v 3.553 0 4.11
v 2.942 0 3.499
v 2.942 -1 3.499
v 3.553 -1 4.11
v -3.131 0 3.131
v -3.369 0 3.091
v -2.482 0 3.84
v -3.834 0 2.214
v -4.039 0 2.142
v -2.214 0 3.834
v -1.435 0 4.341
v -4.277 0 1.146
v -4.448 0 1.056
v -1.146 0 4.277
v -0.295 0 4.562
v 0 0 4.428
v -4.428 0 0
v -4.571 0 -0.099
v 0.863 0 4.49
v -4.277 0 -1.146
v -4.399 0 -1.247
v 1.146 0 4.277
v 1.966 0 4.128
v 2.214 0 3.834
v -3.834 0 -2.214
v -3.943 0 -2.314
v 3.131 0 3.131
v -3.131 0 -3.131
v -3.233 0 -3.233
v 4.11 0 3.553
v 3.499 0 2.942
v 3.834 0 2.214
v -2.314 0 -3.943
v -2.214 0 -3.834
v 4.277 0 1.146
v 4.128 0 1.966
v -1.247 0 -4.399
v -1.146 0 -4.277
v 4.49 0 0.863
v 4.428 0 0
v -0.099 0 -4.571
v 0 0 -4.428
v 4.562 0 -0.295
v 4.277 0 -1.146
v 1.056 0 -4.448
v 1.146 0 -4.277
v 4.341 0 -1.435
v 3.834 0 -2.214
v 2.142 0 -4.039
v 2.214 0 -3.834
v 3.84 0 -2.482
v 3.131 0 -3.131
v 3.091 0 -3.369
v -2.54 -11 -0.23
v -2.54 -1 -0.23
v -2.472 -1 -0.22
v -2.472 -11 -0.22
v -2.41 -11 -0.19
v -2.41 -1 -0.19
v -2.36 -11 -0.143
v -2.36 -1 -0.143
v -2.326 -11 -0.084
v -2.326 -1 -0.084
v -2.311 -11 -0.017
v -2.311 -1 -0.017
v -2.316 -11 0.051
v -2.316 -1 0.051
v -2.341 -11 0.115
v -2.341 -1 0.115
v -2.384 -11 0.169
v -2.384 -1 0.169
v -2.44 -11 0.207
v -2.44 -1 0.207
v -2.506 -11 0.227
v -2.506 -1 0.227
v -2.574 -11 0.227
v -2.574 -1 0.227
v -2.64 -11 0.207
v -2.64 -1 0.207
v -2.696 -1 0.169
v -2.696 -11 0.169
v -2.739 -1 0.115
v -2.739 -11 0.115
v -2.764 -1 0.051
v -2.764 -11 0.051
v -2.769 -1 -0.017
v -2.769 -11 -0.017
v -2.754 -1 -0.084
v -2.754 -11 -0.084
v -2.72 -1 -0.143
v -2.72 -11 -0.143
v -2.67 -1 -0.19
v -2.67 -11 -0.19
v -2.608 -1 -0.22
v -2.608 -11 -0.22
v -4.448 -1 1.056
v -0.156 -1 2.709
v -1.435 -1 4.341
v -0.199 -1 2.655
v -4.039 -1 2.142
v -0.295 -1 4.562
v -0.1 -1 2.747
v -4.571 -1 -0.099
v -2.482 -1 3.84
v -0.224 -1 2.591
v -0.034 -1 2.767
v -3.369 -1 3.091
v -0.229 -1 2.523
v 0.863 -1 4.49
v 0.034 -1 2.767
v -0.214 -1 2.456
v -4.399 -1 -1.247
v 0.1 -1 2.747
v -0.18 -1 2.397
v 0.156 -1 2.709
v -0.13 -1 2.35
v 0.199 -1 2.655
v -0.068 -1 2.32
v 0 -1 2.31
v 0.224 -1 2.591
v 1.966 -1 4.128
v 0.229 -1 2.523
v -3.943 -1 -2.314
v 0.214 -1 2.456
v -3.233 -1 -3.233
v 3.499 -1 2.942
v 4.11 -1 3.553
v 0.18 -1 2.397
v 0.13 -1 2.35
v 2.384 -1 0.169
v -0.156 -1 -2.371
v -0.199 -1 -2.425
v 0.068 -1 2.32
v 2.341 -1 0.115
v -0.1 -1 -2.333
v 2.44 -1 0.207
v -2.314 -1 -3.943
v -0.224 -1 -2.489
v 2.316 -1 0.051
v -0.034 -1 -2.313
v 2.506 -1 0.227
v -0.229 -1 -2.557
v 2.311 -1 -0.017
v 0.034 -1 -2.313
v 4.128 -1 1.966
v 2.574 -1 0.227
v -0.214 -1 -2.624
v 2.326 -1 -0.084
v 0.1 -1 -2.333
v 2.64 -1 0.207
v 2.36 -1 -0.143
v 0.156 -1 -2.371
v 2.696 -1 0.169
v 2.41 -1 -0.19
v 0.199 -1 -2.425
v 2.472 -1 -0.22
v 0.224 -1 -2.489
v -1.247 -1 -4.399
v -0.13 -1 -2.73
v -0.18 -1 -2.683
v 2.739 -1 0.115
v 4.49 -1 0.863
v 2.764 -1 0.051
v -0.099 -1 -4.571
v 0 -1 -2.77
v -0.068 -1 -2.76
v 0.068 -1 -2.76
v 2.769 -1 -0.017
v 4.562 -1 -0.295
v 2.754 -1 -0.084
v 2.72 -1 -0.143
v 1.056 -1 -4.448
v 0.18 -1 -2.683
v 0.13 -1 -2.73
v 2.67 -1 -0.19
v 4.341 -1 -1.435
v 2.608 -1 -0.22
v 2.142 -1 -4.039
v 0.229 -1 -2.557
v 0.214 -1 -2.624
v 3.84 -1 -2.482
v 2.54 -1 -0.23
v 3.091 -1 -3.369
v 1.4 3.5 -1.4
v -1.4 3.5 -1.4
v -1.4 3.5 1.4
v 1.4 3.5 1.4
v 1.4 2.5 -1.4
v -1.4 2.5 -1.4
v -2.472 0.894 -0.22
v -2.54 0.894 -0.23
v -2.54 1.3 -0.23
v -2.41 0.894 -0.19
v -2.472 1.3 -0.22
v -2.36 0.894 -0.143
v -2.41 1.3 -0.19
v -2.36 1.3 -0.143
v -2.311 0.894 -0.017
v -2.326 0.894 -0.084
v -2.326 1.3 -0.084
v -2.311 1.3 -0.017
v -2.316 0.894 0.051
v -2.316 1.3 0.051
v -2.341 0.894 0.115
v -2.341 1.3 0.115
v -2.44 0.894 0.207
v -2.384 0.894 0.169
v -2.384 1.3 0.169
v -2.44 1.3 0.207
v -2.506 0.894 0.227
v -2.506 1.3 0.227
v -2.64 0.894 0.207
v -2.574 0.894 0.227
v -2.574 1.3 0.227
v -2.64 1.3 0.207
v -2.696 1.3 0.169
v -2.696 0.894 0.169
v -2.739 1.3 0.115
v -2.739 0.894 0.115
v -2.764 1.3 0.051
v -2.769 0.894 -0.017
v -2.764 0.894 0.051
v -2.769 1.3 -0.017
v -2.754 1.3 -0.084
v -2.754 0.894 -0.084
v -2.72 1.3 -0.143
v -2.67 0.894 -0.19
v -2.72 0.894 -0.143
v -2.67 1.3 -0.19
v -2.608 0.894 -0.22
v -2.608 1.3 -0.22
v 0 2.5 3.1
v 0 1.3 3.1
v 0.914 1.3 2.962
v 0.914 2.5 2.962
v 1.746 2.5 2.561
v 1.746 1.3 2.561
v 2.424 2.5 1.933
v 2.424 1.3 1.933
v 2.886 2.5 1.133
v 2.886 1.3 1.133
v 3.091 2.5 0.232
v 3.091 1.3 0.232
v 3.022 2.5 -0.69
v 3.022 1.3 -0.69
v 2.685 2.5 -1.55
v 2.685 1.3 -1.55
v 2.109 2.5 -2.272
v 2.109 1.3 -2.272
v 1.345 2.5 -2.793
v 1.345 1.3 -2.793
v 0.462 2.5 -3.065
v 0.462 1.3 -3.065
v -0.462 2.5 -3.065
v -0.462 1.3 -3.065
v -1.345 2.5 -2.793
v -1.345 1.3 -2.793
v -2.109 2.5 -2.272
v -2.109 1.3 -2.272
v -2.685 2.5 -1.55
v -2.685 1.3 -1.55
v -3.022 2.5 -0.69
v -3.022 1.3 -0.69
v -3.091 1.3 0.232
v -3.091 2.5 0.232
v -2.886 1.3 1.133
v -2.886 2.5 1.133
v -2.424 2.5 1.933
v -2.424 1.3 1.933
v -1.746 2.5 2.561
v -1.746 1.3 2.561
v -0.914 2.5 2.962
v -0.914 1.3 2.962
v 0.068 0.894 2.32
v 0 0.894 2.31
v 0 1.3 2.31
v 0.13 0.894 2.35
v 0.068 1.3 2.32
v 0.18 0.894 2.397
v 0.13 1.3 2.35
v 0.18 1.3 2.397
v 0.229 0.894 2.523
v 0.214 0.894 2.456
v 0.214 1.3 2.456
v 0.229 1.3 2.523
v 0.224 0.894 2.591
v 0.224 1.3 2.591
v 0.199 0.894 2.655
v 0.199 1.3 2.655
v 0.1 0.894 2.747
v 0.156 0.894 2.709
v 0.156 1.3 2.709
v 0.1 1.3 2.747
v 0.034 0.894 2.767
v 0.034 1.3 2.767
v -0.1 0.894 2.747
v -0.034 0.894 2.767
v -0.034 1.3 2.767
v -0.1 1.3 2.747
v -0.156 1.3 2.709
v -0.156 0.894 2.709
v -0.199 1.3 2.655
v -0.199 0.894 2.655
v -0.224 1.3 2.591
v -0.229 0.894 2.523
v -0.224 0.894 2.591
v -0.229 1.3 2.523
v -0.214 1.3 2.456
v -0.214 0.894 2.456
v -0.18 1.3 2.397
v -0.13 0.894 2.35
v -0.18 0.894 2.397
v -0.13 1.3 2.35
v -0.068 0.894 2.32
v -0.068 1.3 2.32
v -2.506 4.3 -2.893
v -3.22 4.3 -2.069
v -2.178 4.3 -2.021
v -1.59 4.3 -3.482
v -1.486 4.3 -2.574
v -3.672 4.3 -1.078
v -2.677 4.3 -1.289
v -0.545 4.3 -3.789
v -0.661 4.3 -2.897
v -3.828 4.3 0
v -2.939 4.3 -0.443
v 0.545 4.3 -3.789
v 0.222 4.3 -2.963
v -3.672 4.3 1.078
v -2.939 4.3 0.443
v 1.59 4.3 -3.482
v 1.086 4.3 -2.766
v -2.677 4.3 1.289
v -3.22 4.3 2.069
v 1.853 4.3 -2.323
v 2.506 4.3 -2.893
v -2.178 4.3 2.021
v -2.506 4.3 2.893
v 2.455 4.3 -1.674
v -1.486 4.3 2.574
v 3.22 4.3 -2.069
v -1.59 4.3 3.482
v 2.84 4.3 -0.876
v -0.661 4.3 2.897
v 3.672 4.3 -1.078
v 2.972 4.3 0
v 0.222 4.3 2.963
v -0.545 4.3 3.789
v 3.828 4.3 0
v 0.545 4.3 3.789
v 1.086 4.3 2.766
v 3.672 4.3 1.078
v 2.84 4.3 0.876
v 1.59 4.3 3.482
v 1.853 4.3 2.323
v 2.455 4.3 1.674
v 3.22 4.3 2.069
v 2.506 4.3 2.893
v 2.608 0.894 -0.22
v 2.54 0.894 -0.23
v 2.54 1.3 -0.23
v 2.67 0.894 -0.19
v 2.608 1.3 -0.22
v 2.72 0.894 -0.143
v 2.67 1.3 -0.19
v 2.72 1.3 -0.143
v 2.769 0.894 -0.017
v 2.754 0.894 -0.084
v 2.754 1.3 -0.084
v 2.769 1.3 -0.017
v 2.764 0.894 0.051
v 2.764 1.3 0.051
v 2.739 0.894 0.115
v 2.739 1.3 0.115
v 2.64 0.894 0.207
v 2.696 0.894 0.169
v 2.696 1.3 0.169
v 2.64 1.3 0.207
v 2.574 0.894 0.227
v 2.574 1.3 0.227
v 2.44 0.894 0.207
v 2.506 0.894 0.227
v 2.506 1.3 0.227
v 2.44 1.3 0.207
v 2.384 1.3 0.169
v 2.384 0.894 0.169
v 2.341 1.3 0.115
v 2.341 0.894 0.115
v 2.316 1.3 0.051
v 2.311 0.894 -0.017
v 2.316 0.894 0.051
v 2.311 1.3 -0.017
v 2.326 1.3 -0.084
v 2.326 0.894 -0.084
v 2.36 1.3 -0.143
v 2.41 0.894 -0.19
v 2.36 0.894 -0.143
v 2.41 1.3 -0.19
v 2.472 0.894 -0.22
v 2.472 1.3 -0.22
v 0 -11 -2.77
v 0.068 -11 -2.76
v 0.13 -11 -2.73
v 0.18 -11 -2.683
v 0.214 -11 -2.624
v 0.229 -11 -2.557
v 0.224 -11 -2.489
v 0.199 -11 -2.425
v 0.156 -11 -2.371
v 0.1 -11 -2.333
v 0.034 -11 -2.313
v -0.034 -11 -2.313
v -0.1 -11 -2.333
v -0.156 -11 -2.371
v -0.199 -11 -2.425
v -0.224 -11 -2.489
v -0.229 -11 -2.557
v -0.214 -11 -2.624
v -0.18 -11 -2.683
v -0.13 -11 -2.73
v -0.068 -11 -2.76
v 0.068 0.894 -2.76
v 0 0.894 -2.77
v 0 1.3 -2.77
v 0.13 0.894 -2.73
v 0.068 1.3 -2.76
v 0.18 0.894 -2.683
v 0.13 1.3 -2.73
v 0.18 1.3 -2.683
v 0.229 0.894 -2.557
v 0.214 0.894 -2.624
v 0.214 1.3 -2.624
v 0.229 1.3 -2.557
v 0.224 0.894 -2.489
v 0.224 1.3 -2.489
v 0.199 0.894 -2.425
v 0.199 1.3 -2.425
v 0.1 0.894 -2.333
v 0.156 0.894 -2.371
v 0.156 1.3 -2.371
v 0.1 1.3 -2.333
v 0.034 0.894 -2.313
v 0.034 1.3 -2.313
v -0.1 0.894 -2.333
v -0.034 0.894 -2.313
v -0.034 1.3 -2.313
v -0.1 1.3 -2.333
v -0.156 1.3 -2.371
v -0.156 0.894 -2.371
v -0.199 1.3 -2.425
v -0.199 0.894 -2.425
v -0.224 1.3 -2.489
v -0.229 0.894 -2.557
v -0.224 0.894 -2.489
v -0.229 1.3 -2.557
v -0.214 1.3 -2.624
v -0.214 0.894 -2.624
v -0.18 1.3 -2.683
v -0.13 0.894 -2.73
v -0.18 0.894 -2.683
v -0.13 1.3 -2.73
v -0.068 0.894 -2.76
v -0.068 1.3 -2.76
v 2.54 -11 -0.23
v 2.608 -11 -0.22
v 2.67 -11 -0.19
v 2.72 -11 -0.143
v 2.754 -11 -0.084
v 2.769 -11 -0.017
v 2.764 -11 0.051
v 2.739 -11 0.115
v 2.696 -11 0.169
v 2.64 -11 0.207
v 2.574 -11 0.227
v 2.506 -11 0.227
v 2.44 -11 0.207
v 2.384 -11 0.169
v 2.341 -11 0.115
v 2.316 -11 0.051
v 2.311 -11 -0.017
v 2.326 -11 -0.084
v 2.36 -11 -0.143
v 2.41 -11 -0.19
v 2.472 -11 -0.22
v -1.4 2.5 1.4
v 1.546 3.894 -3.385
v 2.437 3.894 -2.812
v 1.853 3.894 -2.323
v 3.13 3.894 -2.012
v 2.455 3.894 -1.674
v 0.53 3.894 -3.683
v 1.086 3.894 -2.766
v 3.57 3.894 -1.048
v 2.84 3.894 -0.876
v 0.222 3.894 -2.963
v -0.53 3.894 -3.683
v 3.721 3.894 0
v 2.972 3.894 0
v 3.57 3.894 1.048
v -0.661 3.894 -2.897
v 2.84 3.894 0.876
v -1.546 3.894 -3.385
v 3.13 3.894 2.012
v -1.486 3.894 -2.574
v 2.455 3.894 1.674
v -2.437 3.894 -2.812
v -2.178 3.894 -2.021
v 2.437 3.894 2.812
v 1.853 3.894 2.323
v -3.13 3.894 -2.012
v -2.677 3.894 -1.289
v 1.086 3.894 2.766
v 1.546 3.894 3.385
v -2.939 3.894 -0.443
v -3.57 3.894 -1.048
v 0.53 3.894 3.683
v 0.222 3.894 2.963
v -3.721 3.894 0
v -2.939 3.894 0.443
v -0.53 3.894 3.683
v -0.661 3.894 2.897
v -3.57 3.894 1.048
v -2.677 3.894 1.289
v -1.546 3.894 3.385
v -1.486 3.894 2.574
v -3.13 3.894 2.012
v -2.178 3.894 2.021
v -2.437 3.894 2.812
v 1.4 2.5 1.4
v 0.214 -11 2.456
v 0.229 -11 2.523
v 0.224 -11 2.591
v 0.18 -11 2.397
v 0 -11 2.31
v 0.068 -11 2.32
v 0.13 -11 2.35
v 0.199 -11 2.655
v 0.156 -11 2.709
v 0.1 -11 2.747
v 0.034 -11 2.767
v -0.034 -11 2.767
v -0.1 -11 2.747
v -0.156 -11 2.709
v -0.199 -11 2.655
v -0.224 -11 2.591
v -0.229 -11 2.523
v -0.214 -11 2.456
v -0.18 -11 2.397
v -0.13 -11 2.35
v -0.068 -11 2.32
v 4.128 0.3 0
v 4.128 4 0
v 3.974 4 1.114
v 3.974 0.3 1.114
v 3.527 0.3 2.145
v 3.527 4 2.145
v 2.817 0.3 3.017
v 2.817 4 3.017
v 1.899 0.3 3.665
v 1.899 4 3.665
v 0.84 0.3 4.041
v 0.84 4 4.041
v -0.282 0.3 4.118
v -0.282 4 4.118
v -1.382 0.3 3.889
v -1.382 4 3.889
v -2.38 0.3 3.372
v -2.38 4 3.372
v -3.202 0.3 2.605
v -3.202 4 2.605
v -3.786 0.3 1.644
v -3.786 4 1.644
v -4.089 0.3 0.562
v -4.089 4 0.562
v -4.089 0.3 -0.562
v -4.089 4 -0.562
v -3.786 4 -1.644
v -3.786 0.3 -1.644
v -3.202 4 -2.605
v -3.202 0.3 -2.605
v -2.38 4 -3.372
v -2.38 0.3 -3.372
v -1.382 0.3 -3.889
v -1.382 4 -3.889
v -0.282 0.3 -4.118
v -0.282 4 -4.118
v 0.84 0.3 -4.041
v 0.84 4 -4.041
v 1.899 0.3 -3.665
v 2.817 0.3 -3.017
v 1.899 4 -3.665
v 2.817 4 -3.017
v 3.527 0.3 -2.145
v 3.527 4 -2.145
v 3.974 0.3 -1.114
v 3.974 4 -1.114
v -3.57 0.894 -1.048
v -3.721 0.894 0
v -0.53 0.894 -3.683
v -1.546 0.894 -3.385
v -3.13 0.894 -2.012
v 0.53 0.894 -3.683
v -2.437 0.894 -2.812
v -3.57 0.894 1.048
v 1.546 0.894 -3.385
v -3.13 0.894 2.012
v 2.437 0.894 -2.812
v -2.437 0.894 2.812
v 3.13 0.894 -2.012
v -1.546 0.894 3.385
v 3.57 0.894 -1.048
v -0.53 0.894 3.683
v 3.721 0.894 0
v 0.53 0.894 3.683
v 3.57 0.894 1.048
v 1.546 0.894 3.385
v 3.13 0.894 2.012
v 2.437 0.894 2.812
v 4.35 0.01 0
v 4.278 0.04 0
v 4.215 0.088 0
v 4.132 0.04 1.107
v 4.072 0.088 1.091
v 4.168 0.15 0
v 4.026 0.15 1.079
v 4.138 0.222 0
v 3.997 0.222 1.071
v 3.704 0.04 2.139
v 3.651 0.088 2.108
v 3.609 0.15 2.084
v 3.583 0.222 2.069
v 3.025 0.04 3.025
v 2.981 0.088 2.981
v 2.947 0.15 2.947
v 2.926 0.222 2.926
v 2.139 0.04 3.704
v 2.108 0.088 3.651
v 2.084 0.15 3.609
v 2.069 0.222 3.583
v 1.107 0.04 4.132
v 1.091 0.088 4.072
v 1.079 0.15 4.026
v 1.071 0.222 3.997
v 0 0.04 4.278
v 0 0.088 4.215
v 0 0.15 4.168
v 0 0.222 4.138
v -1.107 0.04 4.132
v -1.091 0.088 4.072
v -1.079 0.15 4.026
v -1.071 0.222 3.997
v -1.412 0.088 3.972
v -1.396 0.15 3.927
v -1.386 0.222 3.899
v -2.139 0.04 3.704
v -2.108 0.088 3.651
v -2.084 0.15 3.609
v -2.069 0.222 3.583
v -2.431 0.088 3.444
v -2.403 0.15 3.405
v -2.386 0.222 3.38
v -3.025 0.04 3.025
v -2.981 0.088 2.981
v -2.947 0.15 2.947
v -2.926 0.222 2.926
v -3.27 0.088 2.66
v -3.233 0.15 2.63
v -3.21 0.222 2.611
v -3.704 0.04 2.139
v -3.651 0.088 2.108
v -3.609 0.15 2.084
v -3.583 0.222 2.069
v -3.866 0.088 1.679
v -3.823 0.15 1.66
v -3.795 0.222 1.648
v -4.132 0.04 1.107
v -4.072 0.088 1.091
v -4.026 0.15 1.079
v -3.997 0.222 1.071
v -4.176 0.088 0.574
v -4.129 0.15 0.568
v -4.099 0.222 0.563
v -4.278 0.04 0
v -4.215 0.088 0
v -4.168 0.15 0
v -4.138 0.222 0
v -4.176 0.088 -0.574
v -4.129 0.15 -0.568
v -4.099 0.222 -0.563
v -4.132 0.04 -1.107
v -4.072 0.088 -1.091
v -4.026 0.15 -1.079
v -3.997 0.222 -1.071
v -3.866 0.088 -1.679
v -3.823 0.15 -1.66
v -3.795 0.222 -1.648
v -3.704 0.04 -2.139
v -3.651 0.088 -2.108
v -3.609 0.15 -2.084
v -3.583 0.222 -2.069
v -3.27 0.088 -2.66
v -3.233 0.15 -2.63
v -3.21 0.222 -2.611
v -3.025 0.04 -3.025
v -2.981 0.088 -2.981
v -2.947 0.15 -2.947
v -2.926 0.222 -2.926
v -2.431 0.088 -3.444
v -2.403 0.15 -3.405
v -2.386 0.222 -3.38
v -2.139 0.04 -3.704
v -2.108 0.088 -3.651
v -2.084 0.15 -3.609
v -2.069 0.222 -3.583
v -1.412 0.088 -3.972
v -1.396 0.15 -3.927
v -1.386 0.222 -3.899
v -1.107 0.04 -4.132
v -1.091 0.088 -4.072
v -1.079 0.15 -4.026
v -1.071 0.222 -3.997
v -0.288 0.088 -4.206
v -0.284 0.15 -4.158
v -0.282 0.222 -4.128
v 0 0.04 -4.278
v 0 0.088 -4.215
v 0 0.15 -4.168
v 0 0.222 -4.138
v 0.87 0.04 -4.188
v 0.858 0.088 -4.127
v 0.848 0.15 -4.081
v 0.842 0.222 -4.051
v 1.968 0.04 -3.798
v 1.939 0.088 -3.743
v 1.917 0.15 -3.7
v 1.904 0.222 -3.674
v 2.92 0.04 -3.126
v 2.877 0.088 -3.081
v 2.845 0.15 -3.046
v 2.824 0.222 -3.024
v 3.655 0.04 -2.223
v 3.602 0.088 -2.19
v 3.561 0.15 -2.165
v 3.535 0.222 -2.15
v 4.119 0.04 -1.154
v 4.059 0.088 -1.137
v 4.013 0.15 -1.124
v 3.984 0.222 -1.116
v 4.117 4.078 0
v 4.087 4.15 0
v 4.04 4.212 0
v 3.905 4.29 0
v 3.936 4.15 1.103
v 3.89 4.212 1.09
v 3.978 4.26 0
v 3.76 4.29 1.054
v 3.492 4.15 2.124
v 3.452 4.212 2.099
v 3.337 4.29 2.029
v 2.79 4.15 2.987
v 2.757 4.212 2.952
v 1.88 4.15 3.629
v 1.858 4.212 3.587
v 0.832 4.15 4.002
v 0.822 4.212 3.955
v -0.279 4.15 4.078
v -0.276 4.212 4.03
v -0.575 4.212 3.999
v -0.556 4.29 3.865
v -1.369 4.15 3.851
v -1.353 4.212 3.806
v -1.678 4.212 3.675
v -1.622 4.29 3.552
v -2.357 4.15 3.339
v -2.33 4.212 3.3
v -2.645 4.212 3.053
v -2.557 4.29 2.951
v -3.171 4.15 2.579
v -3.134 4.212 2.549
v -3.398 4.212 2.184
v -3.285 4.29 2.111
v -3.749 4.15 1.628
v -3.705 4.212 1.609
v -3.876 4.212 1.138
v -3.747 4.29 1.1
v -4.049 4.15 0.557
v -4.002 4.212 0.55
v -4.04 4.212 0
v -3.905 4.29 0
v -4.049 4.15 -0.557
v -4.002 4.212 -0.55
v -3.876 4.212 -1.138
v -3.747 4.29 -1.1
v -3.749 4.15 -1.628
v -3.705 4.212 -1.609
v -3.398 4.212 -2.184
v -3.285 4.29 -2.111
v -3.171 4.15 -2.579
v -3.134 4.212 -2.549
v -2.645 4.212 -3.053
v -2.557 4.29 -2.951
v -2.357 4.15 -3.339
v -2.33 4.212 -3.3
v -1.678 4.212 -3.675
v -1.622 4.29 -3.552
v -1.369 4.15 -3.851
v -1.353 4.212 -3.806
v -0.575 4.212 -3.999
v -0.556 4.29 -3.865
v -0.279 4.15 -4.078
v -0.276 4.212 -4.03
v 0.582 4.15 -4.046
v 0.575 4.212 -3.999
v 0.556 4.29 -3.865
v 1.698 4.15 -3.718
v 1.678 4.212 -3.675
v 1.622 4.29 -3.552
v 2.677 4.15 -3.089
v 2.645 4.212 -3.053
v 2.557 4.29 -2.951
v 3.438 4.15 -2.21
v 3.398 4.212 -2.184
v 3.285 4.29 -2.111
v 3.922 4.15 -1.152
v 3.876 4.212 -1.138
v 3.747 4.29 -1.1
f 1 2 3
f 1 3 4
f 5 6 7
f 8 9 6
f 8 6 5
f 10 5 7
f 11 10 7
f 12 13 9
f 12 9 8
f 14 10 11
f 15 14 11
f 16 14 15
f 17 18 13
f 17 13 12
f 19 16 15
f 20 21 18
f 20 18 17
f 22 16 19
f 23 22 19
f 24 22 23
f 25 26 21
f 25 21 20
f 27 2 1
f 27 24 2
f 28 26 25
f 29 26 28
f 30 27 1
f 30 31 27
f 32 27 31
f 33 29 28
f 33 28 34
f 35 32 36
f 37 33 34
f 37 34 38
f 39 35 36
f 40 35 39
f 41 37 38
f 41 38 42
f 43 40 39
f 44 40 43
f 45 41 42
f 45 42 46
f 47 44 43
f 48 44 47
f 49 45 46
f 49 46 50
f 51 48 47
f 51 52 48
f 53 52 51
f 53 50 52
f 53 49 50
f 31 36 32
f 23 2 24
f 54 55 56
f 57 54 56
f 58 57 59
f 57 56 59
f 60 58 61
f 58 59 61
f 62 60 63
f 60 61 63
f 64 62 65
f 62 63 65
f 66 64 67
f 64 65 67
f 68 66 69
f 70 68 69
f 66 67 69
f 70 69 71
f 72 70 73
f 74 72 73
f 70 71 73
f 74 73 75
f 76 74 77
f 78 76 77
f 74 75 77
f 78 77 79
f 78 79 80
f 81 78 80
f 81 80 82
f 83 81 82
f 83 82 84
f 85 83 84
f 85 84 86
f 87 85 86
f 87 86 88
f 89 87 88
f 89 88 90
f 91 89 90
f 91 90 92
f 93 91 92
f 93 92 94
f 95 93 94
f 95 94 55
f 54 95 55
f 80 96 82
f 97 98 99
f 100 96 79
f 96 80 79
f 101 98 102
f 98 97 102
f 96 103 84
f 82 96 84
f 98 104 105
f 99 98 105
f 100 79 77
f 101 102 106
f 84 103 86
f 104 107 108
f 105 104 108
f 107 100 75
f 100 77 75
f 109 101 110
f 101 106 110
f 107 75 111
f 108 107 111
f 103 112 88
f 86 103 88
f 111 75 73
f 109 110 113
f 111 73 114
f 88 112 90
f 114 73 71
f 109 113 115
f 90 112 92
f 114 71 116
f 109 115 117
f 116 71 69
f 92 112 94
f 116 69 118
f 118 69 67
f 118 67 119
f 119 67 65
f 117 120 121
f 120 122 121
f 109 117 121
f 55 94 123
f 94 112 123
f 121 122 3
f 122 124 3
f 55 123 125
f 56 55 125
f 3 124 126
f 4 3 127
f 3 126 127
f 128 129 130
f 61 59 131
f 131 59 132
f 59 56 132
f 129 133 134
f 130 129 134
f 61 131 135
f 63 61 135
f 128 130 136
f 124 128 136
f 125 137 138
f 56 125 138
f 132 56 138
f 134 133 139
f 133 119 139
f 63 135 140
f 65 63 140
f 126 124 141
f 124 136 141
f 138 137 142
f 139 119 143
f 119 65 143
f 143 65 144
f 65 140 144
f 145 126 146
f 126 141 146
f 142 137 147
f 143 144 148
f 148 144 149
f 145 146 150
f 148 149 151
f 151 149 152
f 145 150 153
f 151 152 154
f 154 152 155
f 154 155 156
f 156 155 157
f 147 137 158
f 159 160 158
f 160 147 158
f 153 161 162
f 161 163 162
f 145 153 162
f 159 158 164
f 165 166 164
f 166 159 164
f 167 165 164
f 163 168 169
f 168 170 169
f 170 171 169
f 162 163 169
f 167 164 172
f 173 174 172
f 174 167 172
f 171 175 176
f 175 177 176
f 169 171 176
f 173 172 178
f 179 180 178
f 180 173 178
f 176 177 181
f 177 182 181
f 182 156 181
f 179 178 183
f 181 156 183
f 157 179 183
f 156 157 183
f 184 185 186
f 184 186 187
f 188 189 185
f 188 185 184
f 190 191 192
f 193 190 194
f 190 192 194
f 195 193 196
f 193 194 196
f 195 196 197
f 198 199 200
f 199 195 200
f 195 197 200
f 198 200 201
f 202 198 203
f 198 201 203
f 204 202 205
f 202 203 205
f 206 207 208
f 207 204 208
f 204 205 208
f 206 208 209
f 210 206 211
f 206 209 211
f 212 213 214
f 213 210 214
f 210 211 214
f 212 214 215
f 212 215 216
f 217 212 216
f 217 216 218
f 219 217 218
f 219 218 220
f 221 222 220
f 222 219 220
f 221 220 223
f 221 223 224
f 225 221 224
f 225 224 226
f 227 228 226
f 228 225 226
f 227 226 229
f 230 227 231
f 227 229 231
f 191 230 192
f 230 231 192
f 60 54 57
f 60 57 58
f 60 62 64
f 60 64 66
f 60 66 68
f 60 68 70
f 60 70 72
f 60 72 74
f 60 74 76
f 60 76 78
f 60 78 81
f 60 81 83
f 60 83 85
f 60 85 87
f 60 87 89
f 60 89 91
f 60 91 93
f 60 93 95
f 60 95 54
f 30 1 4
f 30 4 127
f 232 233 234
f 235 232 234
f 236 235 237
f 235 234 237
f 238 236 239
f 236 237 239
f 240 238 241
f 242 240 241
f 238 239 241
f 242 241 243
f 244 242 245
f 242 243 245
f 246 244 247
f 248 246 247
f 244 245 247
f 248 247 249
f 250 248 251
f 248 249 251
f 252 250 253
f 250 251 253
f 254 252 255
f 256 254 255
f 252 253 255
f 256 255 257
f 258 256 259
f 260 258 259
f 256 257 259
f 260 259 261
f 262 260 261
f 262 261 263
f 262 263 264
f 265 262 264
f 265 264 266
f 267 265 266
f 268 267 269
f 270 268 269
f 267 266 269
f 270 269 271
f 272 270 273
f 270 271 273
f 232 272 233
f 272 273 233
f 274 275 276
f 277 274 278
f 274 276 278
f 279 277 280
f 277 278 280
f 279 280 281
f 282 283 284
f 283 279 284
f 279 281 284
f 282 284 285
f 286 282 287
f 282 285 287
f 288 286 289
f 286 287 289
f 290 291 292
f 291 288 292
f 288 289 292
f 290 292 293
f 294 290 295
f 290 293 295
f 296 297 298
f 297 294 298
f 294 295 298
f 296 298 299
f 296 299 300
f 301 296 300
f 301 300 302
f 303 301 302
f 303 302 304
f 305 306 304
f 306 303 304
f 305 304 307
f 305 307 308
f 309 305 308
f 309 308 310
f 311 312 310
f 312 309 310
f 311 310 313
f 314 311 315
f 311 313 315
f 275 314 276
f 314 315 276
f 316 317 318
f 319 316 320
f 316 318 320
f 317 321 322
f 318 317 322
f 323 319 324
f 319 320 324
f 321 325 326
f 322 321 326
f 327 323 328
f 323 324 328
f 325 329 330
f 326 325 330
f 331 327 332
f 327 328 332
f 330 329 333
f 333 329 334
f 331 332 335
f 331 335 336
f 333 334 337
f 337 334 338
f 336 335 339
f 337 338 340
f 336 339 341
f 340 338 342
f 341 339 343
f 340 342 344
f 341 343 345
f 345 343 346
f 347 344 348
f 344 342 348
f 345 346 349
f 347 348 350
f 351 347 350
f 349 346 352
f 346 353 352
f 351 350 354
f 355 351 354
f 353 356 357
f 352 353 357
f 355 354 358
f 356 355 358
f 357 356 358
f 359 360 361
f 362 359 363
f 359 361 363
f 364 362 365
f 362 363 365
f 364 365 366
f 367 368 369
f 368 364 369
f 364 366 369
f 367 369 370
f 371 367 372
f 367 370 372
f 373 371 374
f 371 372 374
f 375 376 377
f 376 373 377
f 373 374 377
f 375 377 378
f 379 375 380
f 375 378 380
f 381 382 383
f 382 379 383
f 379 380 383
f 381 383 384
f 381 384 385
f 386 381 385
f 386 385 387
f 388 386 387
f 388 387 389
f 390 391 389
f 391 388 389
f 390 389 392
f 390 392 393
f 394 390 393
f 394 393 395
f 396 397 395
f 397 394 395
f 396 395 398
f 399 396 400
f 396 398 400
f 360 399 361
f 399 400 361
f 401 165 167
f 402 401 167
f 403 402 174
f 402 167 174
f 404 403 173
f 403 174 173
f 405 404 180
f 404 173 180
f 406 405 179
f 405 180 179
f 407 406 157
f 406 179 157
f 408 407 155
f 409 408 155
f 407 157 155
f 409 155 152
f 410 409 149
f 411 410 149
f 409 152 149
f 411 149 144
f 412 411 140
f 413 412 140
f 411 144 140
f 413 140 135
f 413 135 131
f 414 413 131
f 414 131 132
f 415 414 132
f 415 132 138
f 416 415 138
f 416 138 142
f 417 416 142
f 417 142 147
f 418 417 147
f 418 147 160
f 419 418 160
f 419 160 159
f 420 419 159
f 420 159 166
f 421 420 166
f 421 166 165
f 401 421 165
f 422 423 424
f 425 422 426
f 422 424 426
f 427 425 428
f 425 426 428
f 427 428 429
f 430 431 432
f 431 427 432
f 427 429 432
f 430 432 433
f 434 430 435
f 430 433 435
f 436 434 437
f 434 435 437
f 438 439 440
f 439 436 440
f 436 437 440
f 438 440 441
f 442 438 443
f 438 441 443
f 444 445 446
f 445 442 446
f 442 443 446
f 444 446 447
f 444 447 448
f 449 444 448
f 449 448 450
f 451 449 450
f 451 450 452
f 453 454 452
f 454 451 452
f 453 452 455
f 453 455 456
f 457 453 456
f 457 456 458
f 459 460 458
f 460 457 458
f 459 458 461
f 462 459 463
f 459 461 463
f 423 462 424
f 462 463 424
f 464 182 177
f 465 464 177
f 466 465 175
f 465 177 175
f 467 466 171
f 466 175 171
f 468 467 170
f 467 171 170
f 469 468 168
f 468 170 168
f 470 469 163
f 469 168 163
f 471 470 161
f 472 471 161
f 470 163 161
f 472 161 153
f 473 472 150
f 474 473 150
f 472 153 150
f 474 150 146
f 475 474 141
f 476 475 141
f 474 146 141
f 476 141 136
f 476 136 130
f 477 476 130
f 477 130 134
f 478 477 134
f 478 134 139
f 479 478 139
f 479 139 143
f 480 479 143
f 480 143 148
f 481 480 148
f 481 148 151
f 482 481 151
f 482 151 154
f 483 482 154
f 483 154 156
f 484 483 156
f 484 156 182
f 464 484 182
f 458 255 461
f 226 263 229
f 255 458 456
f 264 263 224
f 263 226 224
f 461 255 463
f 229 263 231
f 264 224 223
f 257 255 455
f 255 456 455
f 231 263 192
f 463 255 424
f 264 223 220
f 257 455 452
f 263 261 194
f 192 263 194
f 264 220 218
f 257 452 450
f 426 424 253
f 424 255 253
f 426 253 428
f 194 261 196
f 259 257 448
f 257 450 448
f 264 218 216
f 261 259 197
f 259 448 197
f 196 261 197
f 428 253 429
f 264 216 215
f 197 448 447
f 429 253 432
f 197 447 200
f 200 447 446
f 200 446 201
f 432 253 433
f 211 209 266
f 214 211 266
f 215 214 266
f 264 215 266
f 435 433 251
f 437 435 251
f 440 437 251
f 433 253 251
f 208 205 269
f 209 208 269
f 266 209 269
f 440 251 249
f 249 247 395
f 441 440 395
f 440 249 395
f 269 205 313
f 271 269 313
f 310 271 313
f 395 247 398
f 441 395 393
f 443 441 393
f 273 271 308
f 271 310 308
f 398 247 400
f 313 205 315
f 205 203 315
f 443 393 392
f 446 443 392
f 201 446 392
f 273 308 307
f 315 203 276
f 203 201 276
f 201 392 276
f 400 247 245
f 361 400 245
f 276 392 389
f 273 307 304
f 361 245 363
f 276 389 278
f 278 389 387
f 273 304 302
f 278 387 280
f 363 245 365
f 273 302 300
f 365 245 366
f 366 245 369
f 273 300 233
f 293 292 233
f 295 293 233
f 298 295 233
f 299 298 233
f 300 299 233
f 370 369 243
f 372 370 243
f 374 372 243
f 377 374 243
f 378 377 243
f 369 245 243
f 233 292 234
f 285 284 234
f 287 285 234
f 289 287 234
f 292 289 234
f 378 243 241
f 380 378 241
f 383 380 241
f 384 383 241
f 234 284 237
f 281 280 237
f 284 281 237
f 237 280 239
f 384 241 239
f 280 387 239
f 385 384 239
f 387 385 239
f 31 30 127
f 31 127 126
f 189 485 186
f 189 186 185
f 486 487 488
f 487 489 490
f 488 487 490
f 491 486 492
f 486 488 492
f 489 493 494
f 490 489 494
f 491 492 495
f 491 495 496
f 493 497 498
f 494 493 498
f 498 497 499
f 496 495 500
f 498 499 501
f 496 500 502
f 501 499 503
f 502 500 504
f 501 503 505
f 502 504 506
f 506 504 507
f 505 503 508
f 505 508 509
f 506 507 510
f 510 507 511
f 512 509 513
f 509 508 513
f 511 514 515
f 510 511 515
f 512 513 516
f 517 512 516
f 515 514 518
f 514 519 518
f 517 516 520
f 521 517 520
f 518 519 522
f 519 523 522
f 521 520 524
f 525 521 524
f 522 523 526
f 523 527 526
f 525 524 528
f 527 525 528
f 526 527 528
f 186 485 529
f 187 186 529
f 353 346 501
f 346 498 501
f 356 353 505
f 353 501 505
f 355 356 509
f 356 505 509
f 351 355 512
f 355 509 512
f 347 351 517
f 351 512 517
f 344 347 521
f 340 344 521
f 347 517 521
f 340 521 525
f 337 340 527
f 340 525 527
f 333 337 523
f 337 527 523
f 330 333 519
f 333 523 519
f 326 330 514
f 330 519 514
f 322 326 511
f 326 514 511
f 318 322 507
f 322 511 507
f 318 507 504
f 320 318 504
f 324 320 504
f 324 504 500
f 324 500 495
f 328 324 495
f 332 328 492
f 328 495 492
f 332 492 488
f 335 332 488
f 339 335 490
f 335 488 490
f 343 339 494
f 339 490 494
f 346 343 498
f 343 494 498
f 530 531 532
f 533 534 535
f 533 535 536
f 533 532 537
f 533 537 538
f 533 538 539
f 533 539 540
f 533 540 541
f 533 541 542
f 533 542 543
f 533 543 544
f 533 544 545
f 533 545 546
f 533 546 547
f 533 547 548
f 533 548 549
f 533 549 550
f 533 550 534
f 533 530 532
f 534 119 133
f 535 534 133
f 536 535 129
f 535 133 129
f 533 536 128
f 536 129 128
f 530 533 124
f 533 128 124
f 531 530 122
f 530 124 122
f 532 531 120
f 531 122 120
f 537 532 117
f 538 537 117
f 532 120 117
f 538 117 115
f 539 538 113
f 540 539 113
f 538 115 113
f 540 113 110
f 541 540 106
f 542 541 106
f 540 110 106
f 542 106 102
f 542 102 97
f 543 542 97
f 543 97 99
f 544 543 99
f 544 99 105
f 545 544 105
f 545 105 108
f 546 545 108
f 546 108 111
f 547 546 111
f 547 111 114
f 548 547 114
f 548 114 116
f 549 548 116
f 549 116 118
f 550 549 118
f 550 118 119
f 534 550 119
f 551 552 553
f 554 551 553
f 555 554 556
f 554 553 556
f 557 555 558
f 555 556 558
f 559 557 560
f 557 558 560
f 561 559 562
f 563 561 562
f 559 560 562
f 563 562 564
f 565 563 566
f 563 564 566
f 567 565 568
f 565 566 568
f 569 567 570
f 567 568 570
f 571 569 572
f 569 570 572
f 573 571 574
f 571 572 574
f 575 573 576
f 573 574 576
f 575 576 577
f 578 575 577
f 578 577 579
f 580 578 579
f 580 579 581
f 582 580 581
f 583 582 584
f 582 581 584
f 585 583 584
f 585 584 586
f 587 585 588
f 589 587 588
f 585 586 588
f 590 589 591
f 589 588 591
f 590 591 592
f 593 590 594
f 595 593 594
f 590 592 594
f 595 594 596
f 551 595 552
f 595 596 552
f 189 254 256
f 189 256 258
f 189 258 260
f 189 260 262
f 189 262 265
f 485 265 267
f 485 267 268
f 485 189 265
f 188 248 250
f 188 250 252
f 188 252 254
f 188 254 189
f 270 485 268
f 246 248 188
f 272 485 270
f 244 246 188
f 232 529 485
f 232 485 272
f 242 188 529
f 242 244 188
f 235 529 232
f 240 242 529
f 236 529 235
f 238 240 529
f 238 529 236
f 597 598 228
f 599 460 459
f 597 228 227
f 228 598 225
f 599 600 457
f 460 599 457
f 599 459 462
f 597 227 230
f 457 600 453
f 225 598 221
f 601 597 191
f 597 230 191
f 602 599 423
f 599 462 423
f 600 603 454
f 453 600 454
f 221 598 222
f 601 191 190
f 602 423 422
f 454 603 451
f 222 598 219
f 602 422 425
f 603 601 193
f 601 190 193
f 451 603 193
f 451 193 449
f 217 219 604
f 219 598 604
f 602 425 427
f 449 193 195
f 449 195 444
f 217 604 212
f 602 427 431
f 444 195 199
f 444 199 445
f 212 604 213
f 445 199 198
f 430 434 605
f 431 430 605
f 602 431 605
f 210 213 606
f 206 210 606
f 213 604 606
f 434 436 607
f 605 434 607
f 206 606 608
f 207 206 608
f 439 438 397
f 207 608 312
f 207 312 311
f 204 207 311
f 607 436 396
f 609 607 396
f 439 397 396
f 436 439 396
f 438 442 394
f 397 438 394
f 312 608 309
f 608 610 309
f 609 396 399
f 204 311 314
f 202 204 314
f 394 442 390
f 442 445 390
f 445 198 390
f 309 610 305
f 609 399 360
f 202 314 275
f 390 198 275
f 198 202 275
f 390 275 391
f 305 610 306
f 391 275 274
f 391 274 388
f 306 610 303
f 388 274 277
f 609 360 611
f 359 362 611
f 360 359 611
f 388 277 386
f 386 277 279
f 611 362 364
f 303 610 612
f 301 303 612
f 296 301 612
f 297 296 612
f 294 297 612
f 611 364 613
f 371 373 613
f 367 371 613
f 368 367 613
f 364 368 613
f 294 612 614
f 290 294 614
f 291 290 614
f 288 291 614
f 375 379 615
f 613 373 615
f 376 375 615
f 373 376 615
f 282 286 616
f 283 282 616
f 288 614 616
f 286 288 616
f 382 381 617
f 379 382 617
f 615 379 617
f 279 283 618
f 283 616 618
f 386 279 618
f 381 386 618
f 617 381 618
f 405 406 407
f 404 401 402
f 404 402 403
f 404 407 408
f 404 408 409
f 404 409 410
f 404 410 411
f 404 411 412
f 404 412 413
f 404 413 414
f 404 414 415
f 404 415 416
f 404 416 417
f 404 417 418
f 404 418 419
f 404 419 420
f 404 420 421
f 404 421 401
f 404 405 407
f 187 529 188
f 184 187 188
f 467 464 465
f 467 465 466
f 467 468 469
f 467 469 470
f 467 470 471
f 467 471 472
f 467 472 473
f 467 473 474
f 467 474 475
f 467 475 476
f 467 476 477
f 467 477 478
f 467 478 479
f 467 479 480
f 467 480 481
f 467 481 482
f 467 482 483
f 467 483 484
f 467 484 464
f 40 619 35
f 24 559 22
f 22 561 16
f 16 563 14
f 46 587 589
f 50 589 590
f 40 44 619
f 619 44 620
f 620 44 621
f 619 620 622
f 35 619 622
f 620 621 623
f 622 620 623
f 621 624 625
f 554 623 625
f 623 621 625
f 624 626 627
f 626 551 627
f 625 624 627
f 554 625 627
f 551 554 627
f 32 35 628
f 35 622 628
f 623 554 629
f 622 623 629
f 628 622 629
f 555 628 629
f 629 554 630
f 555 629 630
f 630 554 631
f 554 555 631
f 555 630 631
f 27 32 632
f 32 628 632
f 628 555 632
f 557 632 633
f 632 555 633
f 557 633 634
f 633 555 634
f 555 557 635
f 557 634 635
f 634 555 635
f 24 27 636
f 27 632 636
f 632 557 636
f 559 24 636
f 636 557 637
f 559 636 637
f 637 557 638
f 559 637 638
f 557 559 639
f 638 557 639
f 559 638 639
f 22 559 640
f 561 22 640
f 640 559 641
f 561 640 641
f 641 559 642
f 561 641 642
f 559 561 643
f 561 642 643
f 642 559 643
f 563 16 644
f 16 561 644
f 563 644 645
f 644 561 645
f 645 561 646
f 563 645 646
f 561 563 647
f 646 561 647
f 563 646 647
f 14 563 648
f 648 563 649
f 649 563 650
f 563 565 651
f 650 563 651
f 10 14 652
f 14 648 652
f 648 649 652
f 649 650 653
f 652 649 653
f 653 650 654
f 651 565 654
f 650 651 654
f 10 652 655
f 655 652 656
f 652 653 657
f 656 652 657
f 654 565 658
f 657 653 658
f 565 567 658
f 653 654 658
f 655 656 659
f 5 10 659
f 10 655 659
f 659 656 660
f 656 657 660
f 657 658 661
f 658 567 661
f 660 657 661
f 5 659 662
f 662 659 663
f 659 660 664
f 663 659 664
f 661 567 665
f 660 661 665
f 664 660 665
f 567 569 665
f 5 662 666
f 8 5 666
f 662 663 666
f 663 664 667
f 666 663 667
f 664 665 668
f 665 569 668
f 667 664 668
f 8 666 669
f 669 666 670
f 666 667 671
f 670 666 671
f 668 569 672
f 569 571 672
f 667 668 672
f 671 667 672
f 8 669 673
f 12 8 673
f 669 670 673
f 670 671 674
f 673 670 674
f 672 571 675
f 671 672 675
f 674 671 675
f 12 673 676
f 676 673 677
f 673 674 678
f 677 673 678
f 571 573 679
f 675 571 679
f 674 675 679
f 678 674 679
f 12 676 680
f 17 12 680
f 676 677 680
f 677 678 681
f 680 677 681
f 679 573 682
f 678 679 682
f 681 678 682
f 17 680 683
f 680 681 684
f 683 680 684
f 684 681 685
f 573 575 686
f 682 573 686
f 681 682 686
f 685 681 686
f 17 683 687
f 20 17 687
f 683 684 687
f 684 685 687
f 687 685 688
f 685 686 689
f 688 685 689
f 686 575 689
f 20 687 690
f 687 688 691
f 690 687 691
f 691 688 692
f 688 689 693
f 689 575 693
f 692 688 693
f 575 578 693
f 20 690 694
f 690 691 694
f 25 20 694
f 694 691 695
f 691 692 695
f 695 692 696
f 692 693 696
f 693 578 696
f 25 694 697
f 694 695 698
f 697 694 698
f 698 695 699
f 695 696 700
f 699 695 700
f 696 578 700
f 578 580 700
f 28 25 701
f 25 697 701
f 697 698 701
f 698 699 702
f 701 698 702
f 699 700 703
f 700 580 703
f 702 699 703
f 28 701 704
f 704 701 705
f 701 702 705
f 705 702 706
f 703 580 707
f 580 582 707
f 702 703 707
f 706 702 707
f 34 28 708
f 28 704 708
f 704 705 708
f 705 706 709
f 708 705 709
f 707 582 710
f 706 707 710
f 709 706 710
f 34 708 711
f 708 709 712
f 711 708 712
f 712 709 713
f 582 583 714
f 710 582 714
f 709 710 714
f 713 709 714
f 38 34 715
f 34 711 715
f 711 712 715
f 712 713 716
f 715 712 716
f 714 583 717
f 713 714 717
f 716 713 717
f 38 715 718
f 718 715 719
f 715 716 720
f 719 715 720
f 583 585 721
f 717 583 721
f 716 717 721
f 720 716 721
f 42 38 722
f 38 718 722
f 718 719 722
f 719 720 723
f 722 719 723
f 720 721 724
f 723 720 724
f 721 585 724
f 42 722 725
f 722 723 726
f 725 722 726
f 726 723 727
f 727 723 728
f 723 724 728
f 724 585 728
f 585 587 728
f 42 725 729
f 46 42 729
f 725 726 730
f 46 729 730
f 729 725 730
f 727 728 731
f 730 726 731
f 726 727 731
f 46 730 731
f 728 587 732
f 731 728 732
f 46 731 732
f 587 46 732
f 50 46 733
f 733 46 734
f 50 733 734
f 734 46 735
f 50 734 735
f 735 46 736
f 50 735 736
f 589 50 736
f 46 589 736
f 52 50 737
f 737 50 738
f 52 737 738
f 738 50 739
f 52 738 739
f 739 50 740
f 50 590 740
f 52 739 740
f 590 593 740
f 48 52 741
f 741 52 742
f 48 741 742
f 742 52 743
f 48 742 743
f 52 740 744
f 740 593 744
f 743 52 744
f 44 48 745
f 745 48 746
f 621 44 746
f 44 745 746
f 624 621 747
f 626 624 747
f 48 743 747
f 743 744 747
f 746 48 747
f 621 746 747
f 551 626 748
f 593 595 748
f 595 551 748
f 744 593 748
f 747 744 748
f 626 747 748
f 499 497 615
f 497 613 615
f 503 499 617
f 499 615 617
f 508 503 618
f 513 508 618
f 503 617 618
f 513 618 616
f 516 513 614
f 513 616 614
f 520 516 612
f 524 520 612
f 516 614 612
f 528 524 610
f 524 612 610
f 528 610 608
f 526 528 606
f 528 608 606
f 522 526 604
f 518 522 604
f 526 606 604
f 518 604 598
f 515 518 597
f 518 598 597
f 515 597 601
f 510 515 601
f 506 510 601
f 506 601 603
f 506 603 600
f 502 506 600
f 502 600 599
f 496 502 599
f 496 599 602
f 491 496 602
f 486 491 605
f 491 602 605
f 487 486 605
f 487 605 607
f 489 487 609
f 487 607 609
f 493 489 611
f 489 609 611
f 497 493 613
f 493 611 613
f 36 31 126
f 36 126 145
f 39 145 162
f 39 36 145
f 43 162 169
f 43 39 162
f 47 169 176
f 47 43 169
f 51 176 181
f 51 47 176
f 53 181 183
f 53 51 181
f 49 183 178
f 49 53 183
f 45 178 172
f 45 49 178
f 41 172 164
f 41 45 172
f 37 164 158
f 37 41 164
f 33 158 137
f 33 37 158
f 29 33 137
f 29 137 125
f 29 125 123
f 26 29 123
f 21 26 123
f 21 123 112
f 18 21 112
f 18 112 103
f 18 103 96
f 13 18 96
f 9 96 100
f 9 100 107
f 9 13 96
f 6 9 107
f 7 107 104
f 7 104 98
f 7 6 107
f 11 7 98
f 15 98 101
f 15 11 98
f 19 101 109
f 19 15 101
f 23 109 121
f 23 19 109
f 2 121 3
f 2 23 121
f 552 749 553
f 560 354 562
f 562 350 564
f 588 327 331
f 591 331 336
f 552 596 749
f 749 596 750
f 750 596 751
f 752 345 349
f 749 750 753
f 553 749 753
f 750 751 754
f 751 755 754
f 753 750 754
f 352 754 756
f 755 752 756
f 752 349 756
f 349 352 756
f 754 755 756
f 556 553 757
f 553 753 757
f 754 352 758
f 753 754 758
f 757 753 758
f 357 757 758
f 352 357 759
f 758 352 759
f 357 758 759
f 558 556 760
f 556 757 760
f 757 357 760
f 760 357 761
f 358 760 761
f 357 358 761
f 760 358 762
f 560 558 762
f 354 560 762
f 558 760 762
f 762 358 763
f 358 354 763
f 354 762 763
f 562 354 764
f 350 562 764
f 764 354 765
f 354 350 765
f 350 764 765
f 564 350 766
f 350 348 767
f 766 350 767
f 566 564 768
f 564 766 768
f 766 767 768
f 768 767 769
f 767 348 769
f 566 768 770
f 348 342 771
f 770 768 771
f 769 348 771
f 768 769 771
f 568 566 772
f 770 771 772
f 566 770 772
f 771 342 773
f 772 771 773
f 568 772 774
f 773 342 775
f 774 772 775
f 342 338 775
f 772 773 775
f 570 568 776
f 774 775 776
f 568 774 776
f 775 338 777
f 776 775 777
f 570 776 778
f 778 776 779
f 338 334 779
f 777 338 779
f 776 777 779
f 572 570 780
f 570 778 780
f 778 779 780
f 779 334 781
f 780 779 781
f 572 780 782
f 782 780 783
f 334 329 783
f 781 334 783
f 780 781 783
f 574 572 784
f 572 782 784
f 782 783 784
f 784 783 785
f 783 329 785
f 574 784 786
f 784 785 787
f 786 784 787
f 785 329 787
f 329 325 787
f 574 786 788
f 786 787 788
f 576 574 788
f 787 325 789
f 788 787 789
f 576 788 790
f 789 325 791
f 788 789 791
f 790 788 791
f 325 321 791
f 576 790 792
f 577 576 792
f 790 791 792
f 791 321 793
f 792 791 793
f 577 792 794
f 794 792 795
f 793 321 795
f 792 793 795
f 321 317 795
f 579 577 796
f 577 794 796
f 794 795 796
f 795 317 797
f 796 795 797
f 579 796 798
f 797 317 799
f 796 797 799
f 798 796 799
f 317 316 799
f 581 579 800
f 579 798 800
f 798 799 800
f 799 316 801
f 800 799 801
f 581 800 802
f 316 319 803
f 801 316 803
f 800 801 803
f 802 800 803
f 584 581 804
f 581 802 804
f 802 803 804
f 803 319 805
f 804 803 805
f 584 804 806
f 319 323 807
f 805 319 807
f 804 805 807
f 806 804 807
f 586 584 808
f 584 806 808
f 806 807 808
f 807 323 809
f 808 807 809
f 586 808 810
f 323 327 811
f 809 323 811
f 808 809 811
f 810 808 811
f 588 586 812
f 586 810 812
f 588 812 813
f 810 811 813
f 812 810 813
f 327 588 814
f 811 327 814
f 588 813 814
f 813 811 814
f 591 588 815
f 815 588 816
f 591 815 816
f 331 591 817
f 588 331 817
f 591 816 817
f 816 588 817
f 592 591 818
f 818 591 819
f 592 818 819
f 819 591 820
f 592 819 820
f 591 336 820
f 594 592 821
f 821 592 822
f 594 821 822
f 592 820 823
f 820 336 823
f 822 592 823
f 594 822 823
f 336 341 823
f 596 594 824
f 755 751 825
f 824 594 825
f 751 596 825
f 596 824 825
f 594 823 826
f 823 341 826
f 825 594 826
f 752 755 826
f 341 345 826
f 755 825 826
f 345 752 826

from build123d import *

# Parameters (mm, degrees)
BOSS_EXTRUDE1_DEPTH      = 1
FILLET1_R                = 0.3
BOSS_EXTRUDE2_DEPTH      = 10
BOSS_EXTRUDE2_DEPTH_BACK = 2.3
SKETCH6_R                = 0.23
SKETCH_2_R               = 3.1
EXTRUDE_1_DEPTH          = 1.2
SKETCH_3_W               = 2.8
SKETCH_3_H               = 2.8
EXTRUDE_2_DEPTH          = 1


with BuildPart() as part:
    # Sketch1 → Boss-Extrude1 (new body)
    with BuildSketch(Plane(origin=(0, 0, 0), x_dir=(1, 0, 0), z_dir=(0, 1, 0))):
        with BuildLine():
            Line((2.942495814, -3.499271693), (3.55315323, -4.10992911))
            Line((3.55315323, -4.10992911), (4.10992911, -3.55315323))
            Line((4.10992911, -3.55315323), (3.499271693, -2.942495814))
            ThreePointArc((3.499271693, -2.942495814), (-3.232892204, 3.232892204), (2.942495814, -3.499271693))
        make_face()
    extrude(amount=-BOSS_EXTRUDE1_DEPTH)

    # Sketch5 → Revolve4 (revolve)
    with BuildSketch(Plane.XY):
        Polygon((4.1275, 4.3), (2.9718, 4.3), (2.9718, 3.8936), (3.7211, 3.8936), (3.7211, 0.8936), (0, 0.8936), (0, 0), (4.1275, 0), align=None)
    revolve(axis=Axis((0, 0.8936, 0), (0, -1, 0)))

    # Fillet1
    fillet1_edges = [part.edges().sort_by_distance(p)[0] for p in [
        (-4.1275, 0, 0),
        (-4.1275, 4.3, 0),
    ]]
    fillet(fillet1_edges, radius=FILLET1_R)

    # Sketch6 → Boss-Extrude2 (add, two sides: drawn at the far end of the back side and taken through both)
    with BuildSketch(Plane.XZ.offset(1).offset(-BOSS_EXTRUDE2_DEPTH_BACK)):
        with Locations(Location((0, -2.54, 0), (0, 0, 270))):
            Circle(SKETCH6_R)
        with Locations(Location((-2.54, 0, 0), (0, 0, 270))):
            Circle(SKETCH6_R)
        with Locations(Location((0, 2.54, 0), (0, 0, 270))):
            Circle(SKETCH6_R)
        with Locations(Location((2.54, 0, 0), (0, 0, 270))):
            Circle(SKETCH6_R)
    extrude(amount=BOSS_EXTRUDE2_DEPTH + BOSS_EXTRUDE2_DEPTH_BACK)

    # Эскиз2 → Бобышка-Вытянуть1 (add)
    with BuildSketch(Plane(origin=(0, 1.3, 0), x_dir=(1, 0, 0), z_dir=(0, 1, 0))):
        with Locations(Location((0, 0, 0), (0, 0, 270))):
            Circle(SKETCH_2_R)
    extrude(amount=EXTRUDE_1_DEPTH)

    # Эскиз3 → Бобышка-Вытянуть2 (add)
    with BuildSketch(Plane(origin=(0, 2.5, 0), x_dir=(1, 0, 0), z_dir=(0, 1, 0))):
        Rectangle(SKETCH_3_W, SKETCH_3_H)
    extrude(amount=EXTRUDE_2_DEPTH)


solid = part.part
